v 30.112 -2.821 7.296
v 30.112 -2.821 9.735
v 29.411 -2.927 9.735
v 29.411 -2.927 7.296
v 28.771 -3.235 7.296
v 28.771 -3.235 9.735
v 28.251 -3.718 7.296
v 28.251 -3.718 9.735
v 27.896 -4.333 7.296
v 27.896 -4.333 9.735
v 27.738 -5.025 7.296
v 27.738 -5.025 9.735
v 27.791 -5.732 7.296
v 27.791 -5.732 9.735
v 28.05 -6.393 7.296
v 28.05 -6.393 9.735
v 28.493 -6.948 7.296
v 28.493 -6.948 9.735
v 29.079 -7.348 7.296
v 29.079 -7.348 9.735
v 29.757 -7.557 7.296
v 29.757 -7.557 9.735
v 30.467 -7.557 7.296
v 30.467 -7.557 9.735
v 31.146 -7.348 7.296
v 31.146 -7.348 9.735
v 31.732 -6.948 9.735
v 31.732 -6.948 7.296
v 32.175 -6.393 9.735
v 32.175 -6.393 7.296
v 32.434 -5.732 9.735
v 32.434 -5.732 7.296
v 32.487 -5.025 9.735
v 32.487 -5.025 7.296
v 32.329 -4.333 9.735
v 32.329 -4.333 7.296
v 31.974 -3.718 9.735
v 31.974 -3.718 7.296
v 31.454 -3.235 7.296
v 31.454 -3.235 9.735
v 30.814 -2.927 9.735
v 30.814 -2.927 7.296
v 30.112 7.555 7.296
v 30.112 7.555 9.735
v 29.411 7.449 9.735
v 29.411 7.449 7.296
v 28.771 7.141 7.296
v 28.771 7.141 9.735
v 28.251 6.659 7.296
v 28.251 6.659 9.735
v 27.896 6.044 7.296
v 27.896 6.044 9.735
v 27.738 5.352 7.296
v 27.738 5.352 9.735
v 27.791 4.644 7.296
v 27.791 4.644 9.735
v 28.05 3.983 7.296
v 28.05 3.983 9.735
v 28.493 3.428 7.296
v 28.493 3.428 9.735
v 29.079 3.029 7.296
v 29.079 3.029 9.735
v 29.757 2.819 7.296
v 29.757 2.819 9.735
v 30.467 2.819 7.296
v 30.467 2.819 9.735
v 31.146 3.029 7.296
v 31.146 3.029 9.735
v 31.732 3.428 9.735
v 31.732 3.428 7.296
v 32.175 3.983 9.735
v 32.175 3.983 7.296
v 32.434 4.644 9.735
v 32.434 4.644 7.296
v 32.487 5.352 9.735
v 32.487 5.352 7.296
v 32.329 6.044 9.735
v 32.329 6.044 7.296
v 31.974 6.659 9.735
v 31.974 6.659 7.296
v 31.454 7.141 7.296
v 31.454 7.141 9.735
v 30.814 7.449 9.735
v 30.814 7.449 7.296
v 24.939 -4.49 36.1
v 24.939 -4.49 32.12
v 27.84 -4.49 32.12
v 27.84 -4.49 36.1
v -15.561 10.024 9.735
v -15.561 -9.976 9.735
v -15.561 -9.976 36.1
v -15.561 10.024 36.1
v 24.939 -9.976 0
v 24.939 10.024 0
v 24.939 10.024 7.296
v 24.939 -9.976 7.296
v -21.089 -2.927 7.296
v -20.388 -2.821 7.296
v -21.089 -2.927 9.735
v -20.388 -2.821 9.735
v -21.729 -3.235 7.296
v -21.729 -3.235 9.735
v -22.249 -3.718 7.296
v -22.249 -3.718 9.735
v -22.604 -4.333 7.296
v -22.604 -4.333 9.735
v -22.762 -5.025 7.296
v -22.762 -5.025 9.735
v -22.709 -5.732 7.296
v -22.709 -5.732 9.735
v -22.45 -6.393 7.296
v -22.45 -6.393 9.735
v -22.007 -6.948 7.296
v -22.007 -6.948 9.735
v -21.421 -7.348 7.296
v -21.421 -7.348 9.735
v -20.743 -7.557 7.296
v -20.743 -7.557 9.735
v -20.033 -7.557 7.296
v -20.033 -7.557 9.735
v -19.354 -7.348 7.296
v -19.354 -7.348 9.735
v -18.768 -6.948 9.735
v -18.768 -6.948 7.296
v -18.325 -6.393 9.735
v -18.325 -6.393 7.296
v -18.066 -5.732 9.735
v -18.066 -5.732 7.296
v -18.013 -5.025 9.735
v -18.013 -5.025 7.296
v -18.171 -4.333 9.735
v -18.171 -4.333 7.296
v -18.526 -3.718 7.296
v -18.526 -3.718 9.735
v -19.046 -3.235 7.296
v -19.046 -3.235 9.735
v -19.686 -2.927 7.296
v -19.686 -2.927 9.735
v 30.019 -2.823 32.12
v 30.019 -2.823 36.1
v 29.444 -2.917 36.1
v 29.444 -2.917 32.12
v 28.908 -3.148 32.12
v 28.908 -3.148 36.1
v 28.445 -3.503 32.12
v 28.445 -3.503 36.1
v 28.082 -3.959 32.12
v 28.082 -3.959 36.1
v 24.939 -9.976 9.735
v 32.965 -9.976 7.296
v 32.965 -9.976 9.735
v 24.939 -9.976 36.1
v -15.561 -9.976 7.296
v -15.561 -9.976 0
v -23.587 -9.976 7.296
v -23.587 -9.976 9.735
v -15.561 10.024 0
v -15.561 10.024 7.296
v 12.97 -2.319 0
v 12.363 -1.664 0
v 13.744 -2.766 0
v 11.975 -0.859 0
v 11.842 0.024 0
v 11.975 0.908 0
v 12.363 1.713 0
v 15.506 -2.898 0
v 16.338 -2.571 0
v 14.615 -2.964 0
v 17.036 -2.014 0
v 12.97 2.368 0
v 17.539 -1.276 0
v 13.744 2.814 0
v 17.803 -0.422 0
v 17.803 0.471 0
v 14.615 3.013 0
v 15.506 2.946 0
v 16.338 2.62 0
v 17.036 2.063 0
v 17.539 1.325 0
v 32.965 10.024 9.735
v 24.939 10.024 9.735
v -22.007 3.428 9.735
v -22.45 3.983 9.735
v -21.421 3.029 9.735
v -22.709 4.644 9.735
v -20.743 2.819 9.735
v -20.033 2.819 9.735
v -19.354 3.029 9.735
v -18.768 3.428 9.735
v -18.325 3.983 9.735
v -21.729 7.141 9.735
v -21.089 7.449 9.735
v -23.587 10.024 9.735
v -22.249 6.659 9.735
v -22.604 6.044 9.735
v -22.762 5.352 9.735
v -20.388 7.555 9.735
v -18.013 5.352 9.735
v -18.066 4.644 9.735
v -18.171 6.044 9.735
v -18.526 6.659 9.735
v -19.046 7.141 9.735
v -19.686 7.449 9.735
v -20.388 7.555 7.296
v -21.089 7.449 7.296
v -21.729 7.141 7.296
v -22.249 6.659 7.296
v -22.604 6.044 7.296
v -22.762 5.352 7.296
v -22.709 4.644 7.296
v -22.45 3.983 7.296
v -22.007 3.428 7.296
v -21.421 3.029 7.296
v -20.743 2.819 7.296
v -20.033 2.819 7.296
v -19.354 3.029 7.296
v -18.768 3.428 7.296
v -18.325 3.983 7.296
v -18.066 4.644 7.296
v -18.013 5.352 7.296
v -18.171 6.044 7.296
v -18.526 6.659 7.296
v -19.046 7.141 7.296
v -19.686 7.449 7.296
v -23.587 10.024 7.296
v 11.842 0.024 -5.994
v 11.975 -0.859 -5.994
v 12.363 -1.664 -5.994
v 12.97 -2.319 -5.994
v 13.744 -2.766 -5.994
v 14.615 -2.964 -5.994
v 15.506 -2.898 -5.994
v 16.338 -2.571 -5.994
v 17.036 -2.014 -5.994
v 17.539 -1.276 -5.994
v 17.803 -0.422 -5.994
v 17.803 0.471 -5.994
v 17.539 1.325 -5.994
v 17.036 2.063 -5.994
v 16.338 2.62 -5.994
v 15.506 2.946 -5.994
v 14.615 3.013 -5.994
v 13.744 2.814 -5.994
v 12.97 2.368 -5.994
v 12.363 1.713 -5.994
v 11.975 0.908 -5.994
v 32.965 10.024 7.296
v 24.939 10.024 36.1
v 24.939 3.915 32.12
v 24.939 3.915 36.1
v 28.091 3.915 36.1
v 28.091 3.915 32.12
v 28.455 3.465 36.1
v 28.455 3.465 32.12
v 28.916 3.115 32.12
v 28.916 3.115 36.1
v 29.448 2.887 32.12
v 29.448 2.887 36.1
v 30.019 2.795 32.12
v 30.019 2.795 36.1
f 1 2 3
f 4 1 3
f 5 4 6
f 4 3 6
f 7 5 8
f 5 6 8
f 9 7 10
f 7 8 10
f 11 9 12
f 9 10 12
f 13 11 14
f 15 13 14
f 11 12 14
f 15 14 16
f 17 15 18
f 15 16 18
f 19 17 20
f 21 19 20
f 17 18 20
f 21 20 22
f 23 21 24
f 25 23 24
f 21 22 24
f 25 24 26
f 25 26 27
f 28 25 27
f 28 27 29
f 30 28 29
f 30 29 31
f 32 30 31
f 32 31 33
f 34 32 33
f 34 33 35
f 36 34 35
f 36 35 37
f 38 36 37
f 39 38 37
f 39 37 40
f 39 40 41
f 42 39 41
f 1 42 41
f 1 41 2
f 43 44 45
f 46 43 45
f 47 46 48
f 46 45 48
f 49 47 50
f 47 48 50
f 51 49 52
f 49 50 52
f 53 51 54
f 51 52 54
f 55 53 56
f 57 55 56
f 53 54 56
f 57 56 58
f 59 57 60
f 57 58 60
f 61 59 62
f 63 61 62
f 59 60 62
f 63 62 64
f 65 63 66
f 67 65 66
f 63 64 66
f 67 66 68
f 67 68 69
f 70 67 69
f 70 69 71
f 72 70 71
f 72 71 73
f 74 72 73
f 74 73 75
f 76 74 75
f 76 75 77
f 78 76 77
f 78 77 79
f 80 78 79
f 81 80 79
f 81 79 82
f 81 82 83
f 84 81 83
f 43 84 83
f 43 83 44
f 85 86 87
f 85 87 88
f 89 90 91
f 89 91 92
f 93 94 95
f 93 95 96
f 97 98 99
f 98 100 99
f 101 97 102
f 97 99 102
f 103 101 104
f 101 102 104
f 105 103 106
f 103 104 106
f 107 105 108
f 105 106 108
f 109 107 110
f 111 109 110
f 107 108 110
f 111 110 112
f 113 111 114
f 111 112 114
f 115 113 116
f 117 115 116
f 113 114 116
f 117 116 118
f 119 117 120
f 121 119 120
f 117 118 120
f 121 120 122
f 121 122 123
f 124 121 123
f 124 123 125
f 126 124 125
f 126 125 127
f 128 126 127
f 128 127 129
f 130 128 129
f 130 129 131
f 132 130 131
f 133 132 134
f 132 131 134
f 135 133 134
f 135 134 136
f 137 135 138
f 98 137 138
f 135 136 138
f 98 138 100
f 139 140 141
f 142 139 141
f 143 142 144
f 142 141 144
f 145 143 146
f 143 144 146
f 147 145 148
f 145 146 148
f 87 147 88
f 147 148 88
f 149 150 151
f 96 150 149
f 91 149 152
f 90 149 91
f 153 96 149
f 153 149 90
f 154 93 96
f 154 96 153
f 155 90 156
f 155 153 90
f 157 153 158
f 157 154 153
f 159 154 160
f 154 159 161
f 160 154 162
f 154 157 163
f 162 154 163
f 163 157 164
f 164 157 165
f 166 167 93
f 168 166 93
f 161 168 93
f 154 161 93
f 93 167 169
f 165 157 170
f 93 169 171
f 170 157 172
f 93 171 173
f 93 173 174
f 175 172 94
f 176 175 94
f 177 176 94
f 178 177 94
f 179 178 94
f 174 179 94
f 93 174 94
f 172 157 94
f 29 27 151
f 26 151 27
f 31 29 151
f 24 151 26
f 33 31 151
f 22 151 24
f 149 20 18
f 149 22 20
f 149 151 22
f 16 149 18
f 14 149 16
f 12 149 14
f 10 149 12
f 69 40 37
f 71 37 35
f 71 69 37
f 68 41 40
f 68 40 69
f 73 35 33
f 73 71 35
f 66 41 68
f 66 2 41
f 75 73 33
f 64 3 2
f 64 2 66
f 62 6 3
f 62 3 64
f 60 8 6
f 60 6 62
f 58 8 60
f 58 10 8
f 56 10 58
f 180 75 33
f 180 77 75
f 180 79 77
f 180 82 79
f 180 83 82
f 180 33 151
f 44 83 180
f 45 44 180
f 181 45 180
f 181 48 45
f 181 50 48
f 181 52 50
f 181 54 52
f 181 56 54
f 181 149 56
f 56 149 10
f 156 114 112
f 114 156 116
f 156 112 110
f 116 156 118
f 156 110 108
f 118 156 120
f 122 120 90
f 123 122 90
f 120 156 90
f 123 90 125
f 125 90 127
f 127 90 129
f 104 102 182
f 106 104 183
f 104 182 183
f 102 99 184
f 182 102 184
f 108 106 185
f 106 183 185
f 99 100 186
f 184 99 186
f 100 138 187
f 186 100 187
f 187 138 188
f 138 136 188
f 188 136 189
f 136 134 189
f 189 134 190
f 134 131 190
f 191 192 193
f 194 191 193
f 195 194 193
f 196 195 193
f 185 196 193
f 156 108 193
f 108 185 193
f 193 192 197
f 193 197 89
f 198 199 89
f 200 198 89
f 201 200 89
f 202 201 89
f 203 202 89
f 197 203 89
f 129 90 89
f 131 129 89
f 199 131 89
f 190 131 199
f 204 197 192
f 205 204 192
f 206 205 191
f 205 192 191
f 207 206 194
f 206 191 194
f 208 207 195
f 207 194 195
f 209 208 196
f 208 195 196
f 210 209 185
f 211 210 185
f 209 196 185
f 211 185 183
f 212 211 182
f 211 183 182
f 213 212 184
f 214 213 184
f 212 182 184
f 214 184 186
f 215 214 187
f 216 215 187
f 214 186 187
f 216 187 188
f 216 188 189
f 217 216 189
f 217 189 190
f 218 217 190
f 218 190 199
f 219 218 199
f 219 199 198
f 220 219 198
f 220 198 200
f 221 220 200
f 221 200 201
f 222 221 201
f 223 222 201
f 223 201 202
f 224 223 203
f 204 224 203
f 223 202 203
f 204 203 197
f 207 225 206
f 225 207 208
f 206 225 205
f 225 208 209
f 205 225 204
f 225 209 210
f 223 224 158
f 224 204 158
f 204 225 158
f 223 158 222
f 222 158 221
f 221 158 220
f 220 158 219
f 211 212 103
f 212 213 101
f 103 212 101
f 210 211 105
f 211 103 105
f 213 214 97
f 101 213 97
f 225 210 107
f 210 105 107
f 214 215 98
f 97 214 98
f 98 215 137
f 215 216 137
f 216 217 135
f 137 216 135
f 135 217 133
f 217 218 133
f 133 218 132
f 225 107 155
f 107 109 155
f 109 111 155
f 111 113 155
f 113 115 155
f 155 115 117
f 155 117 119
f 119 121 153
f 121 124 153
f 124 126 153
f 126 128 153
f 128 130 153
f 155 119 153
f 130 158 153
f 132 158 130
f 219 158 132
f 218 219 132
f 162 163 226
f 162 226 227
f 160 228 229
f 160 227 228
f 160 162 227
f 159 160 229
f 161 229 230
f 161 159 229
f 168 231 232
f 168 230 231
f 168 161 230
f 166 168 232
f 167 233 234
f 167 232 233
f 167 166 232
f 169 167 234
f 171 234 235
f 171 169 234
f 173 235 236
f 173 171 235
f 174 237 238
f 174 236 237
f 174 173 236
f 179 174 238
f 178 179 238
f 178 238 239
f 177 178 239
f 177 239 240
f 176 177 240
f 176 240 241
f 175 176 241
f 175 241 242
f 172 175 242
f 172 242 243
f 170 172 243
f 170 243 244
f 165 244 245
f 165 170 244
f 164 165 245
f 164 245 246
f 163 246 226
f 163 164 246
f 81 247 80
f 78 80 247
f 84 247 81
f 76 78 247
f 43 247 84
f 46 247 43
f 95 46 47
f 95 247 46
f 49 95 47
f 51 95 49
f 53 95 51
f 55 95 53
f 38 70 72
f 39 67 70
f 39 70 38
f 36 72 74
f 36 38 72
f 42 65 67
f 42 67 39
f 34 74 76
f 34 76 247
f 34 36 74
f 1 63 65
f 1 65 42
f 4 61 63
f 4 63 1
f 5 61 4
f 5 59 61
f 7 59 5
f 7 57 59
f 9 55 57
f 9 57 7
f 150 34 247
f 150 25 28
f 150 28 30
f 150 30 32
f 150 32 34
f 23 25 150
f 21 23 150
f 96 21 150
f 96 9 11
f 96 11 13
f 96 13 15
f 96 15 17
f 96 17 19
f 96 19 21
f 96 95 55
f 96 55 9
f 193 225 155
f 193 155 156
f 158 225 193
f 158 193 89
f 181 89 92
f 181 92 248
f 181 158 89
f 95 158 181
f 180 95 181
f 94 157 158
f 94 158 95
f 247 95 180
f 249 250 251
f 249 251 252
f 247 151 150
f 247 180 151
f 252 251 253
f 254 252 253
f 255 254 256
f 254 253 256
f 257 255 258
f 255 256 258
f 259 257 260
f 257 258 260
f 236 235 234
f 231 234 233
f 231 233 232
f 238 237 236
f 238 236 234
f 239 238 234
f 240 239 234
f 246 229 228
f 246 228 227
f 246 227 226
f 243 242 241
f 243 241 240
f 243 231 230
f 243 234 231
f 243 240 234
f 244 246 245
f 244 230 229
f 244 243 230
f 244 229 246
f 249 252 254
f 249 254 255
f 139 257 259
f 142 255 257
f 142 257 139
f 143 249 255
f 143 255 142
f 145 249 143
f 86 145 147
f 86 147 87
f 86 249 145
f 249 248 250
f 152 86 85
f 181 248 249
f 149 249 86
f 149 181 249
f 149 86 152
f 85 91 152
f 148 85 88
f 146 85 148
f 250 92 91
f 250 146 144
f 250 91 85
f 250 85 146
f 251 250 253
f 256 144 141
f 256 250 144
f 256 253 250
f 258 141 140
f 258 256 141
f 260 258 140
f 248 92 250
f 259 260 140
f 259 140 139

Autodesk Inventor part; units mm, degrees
ref_plane "YZ Plane" through (0, 0, 0) normal (1, 0, 0) x (0, 1, 0)
ref_plane "XZ Plane" through (0, 0, 0) normal (0, 1, 0) x (-1, 0, 0)
ref_plane "XY Plane" through (0, 0, 0) normal (0, 0, 1) x (1, 0, 0)
sketch "Sketch1" plane through (0, 0, 0) normal (0, 0, 1) x (1, 0, 0)
  line L0 (-15.561, 10.0244) -> (24.939, 10.0244)
  line L1 (24.939, 10.0244) -> (24.939, -9.9756)
  line L2 (24.939, -9.9756) -> (-15.561, -9.9756)
  line L3 (-15.561, -9.9756) -> (-15.561, 10.0244)
  point P0 (0, 0)
  dimension "d0" = 20
  dimension "d1" = 40.5
extrude "Extrusion1" add sketch "Sketch1" along normal blind 36.1
sketch "Sketch2" plane through (24.939, -9.9756, 0) normal (1, 0, 0) x (0, 0, -1)
  line L0 (-36.1, 20) -> (-36.1, 0) projected
  line L1 (-36.1, 13.8904) -> (-32.1201, 13.8904)
  line L2 (-32.1201, 13.8904) -> (-32.1201, 5.486)
  line L3 (-32.1201, 5.486) -> (-36.1, 5.486)
  line L4 (-36.1, 5.486) -> (-36.1, 13.8904)
  point P0 (0, 9.9756)
extrude "Extrusion2" add sketch "Sketch2" along normal blind 5.08
sketch "Sketch3" plane through (24.939, -9.9756, 0) normal (1, 0, 0) x (0, 0, -1)
  line L0 (-36.1, 13.8904) -> (-36.1, 20) projected
  line L1 (-7.2964, 16.9452) -> (-7.2964, 3.5991)
  line L2 (-9.7348, 3.5991) -> (-9.7348, 16.9452)
  line L3 (-9.7348, 16.9452) -> (-9.7348, 20)
  line L4 (0, 20) -> (-36.1, 20) projected
  line L5 (-7.2964, 16.9452) -> (-7.2964, 20)
  line L6 (-7.2964, 3.5991) -> (-7.2964, 0)
  line L7 (0, 0) -> (-36.1, 0) projected
  line L8 (-9.7348, 3.5991) -> (-9.7348, 0)
  point P0 (0, 9.9756)
extrude "Extrusion3" add sketch "Sketch3" along normal blind 8.0264
sketch "Sketch4" plane through (-15.561, -9.9756, 0) normal (-1, 0, 0) x (0, 0, 1)
  line L0 (0, 0) -> (7.2964, 0) projected
  line L1 (9.7348, 20) -> (36.1, 20) projected
  line L2 (7.2964, 0) -> (9.7348, 0)
  line L3 (9.7348, 0) -> (9.7348, 20)
  line L4 (9.7348, 20) -> (7.2964, 20)
  line L5 (7.2964, 20) -> (7.2964, 0)
  point P0 (0, 9.9756)
extrude "Extrusion4" add sketch "Sketch4" along normal blind 8.0264
sketch "Sketch5" plane through (24.939, -9.9756, 7.2964) normal (0, 0, -1) x (-1, 0, 0)
  line L0 (0, 20) -> (-8.0264, 20) projected
  circle A0 centre (-5.1734, 4.773) radius 2.3347
  line L1 (40.5, 0) -> (48.5264, 0) projected
  line L2 (40.5, 20) -> (48.5264, 20) projected
  circle A1 centre (45.3266, 4.773) radius 2.3347
  circle A2 centre (45.3266, 15.1496) radius 2.3347
  circle A3 centre (-5.1734, 15.1496) radius 2.3347
  point P0 (24.939, 9.9756)
  dimension "d18" = 50.5
hole "Hole1" at (30.1124, -5.2026, 7.2964) at (30.1124, 5.174, 7.2964) at (-20.3876, -5.2026, 7.2964) at (-20.3876, 5.174, 7.2964) direction (0, 0, 1) diameter 4.7625 end through all
sketch "Sketch6" plane through (0, 0, 0) normal (0, 0, -1) x (-1, 0, 0)
  line L0 (15.561, -9.9756) -> (15.561, 10.0244) projected
  line L1 (15.561, 0.0244) -> (-14.839, 0.0244)
  circle A0 centre (-14.839, 0.0244) radius 2.9972
  point P0 (0, 0)
  dimension "d26" = 30.4
  dimension "d27" = 5.9944
extrude "Extrusion5" add sketch "Sketch6" along normal blind 5.9944
sketch "Sketch7" plane through (0, 0, 36.1) normal (0, 0, 1) x (1, 0, 0)
  point P0 (0, 0)
sketch "Sketch8" plane through (0, 0, 0) normal (0, 0, -1) x (-1, 0, 0)
  line L0 (15.561, -9.9756) -> (15.561, 10.0244) projected
  circle A0 centre (20.3876, -5.2026) radius 2.3813 projected
  line L1 (15.561, -9.9756) -> (23.5874, -9.9756) projected
  point P0 (0, 0)
  dimension "d30" = 4.8266
  dimension "d31" = 4.7625
  dimension "d33" = 4.773
properties part number "Aidan Sherry Servo motor"
